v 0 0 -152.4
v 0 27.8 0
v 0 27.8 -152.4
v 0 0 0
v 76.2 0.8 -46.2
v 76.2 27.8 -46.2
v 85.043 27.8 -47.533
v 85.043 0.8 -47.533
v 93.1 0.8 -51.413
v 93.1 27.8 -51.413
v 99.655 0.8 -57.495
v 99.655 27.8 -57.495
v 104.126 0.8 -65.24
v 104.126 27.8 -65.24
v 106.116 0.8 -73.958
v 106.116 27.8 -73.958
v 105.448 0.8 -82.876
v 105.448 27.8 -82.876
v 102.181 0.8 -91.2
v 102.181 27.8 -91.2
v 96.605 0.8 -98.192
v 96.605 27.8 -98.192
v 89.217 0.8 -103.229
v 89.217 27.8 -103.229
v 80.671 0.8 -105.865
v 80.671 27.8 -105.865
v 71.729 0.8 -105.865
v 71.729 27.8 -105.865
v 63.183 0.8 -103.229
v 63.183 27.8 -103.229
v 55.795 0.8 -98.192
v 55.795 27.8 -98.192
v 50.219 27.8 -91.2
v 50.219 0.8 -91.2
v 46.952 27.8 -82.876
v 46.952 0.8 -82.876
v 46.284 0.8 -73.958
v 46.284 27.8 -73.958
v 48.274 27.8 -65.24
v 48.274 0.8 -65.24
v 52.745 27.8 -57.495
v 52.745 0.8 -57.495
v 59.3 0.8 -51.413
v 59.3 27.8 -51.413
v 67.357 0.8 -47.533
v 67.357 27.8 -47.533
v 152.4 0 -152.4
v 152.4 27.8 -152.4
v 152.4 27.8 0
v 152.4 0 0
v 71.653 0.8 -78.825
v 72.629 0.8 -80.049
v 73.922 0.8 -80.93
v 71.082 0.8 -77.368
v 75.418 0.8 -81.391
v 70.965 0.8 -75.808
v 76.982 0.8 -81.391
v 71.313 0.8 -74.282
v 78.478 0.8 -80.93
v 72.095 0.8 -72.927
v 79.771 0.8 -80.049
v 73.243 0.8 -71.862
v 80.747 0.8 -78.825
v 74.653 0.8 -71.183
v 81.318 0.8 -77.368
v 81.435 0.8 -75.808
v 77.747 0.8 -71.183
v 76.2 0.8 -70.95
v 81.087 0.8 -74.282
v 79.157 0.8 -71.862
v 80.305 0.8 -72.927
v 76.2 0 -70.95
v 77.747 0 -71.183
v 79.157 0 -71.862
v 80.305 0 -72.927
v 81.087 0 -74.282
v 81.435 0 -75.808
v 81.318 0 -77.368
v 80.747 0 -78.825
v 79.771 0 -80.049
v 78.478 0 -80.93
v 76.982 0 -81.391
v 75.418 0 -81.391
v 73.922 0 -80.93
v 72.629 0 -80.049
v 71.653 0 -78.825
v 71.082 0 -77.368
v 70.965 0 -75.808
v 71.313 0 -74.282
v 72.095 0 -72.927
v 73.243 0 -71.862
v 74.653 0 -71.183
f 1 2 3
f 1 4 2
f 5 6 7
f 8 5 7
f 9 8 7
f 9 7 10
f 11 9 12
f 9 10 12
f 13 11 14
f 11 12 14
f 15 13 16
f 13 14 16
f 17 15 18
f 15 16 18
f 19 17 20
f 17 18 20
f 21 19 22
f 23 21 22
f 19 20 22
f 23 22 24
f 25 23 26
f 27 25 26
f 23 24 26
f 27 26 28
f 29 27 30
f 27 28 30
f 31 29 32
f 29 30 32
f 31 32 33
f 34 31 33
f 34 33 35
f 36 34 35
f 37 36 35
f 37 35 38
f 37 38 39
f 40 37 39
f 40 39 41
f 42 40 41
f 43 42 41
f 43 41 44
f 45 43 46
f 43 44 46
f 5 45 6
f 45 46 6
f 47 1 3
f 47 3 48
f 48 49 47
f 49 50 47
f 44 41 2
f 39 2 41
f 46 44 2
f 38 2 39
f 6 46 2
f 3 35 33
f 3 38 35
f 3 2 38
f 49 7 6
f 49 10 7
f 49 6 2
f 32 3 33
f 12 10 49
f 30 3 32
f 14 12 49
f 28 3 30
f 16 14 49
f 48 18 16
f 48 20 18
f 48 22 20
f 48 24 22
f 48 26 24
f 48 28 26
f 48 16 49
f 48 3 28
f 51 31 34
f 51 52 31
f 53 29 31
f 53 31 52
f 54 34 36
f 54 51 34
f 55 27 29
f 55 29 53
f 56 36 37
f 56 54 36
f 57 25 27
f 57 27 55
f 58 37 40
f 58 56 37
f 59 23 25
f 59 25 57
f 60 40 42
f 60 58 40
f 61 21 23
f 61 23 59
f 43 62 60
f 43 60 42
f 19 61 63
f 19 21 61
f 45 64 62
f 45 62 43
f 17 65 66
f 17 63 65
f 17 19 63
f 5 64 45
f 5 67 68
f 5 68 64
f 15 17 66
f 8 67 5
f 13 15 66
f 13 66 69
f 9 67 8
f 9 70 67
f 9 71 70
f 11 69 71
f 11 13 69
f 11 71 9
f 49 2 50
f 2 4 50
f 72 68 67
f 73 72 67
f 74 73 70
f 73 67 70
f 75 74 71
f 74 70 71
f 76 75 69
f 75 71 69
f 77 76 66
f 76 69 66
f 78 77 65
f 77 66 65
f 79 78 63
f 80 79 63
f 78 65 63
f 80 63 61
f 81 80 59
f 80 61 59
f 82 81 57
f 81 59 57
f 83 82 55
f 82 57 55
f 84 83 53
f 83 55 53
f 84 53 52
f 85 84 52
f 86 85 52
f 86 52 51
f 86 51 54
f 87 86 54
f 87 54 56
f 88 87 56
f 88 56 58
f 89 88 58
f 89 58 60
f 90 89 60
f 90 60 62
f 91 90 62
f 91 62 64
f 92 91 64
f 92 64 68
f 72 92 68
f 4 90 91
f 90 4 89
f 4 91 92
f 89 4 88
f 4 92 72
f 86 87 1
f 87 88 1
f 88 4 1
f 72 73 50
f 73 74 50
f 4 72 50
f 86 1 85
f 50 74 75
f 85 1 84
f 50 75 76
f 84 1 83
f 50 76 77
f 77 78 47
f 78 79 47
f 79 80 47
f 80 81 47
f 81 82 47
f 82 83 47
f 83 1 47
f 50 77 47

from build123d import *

# Parameters (mm, degrees)
SKETCH1_W           = 152.4
SKETCH1_H           = 152.4
BOSS_EXTRUDE1_DEPTH = 0.8
SKETCH2_R           = 5.25
CUT_EXTRUDE2_DEPTH  = 254
SKETCH3_W           = 152.4
SKETCH3_H           = 152.4
BOSS_EXTRUDE2_DEPTH = 27
SKETCH4_R           = 30
CUT_EXTRUDE3_DEPTH  = 27


with BuildPart() as part:
    # Sketch1 → Boss-Extrude1 (new body)
    with BuildSketch(Plane(origin=(0, 0, 0), x_dir=(1, 0, 0), z_dir=(0, 1, 0))):
        with Locations((76.2, 76.2)):
            Rectangle(SKETCH1_W, SKETCH1_H)
    extrude(amount=BOSS_EXTRUDE1_DEPTH)

    # Sketch2 → Cut-Extrude2 (cut)
    with BuildSketch(Plane(origin=(0, 0.8, 0), x_dir=(1, 0, 0), z_dir=(0, 1, 0))):
        with Locations(Location((76.2, 76.2, 0), (0, 0, 270))):
            Circle(SKETCH2_R)
    extrude(amount=-CUT_EXTRUDE2_DEPTH, mode=Mode.SUBTRACT)

    # Sketch3 → Boss-Extrude2 (add)
    with BuildSketch(Plane(origin=(0, 0.8, 0), x_dir=(1, 0, 0), z_dir=(0, 1, 0))):
        with Locations((76.2, 76.2)):
            Rectangle(SKETCH3_W, SKETCH3_H)
    extrude(amount=BOSS_EXTRUDE2_DEPTH)

    # Sketch4 → Cut-Extrude3 (cut)
    with BuildSketch(Plane(origin=(0, 27.8, 0), x_dir=(1, 0, 0), z_dir=(0, 1, 0))):
        with Locations(Location((76.2, 76.2, 0), (0, 0, 270))):
            Circle(SKETCH4_R)
    extrude(amount=-CUT_EXTRUDE3_DEPTH, mode=Mode.SUBTRACT)


solid = part.part
